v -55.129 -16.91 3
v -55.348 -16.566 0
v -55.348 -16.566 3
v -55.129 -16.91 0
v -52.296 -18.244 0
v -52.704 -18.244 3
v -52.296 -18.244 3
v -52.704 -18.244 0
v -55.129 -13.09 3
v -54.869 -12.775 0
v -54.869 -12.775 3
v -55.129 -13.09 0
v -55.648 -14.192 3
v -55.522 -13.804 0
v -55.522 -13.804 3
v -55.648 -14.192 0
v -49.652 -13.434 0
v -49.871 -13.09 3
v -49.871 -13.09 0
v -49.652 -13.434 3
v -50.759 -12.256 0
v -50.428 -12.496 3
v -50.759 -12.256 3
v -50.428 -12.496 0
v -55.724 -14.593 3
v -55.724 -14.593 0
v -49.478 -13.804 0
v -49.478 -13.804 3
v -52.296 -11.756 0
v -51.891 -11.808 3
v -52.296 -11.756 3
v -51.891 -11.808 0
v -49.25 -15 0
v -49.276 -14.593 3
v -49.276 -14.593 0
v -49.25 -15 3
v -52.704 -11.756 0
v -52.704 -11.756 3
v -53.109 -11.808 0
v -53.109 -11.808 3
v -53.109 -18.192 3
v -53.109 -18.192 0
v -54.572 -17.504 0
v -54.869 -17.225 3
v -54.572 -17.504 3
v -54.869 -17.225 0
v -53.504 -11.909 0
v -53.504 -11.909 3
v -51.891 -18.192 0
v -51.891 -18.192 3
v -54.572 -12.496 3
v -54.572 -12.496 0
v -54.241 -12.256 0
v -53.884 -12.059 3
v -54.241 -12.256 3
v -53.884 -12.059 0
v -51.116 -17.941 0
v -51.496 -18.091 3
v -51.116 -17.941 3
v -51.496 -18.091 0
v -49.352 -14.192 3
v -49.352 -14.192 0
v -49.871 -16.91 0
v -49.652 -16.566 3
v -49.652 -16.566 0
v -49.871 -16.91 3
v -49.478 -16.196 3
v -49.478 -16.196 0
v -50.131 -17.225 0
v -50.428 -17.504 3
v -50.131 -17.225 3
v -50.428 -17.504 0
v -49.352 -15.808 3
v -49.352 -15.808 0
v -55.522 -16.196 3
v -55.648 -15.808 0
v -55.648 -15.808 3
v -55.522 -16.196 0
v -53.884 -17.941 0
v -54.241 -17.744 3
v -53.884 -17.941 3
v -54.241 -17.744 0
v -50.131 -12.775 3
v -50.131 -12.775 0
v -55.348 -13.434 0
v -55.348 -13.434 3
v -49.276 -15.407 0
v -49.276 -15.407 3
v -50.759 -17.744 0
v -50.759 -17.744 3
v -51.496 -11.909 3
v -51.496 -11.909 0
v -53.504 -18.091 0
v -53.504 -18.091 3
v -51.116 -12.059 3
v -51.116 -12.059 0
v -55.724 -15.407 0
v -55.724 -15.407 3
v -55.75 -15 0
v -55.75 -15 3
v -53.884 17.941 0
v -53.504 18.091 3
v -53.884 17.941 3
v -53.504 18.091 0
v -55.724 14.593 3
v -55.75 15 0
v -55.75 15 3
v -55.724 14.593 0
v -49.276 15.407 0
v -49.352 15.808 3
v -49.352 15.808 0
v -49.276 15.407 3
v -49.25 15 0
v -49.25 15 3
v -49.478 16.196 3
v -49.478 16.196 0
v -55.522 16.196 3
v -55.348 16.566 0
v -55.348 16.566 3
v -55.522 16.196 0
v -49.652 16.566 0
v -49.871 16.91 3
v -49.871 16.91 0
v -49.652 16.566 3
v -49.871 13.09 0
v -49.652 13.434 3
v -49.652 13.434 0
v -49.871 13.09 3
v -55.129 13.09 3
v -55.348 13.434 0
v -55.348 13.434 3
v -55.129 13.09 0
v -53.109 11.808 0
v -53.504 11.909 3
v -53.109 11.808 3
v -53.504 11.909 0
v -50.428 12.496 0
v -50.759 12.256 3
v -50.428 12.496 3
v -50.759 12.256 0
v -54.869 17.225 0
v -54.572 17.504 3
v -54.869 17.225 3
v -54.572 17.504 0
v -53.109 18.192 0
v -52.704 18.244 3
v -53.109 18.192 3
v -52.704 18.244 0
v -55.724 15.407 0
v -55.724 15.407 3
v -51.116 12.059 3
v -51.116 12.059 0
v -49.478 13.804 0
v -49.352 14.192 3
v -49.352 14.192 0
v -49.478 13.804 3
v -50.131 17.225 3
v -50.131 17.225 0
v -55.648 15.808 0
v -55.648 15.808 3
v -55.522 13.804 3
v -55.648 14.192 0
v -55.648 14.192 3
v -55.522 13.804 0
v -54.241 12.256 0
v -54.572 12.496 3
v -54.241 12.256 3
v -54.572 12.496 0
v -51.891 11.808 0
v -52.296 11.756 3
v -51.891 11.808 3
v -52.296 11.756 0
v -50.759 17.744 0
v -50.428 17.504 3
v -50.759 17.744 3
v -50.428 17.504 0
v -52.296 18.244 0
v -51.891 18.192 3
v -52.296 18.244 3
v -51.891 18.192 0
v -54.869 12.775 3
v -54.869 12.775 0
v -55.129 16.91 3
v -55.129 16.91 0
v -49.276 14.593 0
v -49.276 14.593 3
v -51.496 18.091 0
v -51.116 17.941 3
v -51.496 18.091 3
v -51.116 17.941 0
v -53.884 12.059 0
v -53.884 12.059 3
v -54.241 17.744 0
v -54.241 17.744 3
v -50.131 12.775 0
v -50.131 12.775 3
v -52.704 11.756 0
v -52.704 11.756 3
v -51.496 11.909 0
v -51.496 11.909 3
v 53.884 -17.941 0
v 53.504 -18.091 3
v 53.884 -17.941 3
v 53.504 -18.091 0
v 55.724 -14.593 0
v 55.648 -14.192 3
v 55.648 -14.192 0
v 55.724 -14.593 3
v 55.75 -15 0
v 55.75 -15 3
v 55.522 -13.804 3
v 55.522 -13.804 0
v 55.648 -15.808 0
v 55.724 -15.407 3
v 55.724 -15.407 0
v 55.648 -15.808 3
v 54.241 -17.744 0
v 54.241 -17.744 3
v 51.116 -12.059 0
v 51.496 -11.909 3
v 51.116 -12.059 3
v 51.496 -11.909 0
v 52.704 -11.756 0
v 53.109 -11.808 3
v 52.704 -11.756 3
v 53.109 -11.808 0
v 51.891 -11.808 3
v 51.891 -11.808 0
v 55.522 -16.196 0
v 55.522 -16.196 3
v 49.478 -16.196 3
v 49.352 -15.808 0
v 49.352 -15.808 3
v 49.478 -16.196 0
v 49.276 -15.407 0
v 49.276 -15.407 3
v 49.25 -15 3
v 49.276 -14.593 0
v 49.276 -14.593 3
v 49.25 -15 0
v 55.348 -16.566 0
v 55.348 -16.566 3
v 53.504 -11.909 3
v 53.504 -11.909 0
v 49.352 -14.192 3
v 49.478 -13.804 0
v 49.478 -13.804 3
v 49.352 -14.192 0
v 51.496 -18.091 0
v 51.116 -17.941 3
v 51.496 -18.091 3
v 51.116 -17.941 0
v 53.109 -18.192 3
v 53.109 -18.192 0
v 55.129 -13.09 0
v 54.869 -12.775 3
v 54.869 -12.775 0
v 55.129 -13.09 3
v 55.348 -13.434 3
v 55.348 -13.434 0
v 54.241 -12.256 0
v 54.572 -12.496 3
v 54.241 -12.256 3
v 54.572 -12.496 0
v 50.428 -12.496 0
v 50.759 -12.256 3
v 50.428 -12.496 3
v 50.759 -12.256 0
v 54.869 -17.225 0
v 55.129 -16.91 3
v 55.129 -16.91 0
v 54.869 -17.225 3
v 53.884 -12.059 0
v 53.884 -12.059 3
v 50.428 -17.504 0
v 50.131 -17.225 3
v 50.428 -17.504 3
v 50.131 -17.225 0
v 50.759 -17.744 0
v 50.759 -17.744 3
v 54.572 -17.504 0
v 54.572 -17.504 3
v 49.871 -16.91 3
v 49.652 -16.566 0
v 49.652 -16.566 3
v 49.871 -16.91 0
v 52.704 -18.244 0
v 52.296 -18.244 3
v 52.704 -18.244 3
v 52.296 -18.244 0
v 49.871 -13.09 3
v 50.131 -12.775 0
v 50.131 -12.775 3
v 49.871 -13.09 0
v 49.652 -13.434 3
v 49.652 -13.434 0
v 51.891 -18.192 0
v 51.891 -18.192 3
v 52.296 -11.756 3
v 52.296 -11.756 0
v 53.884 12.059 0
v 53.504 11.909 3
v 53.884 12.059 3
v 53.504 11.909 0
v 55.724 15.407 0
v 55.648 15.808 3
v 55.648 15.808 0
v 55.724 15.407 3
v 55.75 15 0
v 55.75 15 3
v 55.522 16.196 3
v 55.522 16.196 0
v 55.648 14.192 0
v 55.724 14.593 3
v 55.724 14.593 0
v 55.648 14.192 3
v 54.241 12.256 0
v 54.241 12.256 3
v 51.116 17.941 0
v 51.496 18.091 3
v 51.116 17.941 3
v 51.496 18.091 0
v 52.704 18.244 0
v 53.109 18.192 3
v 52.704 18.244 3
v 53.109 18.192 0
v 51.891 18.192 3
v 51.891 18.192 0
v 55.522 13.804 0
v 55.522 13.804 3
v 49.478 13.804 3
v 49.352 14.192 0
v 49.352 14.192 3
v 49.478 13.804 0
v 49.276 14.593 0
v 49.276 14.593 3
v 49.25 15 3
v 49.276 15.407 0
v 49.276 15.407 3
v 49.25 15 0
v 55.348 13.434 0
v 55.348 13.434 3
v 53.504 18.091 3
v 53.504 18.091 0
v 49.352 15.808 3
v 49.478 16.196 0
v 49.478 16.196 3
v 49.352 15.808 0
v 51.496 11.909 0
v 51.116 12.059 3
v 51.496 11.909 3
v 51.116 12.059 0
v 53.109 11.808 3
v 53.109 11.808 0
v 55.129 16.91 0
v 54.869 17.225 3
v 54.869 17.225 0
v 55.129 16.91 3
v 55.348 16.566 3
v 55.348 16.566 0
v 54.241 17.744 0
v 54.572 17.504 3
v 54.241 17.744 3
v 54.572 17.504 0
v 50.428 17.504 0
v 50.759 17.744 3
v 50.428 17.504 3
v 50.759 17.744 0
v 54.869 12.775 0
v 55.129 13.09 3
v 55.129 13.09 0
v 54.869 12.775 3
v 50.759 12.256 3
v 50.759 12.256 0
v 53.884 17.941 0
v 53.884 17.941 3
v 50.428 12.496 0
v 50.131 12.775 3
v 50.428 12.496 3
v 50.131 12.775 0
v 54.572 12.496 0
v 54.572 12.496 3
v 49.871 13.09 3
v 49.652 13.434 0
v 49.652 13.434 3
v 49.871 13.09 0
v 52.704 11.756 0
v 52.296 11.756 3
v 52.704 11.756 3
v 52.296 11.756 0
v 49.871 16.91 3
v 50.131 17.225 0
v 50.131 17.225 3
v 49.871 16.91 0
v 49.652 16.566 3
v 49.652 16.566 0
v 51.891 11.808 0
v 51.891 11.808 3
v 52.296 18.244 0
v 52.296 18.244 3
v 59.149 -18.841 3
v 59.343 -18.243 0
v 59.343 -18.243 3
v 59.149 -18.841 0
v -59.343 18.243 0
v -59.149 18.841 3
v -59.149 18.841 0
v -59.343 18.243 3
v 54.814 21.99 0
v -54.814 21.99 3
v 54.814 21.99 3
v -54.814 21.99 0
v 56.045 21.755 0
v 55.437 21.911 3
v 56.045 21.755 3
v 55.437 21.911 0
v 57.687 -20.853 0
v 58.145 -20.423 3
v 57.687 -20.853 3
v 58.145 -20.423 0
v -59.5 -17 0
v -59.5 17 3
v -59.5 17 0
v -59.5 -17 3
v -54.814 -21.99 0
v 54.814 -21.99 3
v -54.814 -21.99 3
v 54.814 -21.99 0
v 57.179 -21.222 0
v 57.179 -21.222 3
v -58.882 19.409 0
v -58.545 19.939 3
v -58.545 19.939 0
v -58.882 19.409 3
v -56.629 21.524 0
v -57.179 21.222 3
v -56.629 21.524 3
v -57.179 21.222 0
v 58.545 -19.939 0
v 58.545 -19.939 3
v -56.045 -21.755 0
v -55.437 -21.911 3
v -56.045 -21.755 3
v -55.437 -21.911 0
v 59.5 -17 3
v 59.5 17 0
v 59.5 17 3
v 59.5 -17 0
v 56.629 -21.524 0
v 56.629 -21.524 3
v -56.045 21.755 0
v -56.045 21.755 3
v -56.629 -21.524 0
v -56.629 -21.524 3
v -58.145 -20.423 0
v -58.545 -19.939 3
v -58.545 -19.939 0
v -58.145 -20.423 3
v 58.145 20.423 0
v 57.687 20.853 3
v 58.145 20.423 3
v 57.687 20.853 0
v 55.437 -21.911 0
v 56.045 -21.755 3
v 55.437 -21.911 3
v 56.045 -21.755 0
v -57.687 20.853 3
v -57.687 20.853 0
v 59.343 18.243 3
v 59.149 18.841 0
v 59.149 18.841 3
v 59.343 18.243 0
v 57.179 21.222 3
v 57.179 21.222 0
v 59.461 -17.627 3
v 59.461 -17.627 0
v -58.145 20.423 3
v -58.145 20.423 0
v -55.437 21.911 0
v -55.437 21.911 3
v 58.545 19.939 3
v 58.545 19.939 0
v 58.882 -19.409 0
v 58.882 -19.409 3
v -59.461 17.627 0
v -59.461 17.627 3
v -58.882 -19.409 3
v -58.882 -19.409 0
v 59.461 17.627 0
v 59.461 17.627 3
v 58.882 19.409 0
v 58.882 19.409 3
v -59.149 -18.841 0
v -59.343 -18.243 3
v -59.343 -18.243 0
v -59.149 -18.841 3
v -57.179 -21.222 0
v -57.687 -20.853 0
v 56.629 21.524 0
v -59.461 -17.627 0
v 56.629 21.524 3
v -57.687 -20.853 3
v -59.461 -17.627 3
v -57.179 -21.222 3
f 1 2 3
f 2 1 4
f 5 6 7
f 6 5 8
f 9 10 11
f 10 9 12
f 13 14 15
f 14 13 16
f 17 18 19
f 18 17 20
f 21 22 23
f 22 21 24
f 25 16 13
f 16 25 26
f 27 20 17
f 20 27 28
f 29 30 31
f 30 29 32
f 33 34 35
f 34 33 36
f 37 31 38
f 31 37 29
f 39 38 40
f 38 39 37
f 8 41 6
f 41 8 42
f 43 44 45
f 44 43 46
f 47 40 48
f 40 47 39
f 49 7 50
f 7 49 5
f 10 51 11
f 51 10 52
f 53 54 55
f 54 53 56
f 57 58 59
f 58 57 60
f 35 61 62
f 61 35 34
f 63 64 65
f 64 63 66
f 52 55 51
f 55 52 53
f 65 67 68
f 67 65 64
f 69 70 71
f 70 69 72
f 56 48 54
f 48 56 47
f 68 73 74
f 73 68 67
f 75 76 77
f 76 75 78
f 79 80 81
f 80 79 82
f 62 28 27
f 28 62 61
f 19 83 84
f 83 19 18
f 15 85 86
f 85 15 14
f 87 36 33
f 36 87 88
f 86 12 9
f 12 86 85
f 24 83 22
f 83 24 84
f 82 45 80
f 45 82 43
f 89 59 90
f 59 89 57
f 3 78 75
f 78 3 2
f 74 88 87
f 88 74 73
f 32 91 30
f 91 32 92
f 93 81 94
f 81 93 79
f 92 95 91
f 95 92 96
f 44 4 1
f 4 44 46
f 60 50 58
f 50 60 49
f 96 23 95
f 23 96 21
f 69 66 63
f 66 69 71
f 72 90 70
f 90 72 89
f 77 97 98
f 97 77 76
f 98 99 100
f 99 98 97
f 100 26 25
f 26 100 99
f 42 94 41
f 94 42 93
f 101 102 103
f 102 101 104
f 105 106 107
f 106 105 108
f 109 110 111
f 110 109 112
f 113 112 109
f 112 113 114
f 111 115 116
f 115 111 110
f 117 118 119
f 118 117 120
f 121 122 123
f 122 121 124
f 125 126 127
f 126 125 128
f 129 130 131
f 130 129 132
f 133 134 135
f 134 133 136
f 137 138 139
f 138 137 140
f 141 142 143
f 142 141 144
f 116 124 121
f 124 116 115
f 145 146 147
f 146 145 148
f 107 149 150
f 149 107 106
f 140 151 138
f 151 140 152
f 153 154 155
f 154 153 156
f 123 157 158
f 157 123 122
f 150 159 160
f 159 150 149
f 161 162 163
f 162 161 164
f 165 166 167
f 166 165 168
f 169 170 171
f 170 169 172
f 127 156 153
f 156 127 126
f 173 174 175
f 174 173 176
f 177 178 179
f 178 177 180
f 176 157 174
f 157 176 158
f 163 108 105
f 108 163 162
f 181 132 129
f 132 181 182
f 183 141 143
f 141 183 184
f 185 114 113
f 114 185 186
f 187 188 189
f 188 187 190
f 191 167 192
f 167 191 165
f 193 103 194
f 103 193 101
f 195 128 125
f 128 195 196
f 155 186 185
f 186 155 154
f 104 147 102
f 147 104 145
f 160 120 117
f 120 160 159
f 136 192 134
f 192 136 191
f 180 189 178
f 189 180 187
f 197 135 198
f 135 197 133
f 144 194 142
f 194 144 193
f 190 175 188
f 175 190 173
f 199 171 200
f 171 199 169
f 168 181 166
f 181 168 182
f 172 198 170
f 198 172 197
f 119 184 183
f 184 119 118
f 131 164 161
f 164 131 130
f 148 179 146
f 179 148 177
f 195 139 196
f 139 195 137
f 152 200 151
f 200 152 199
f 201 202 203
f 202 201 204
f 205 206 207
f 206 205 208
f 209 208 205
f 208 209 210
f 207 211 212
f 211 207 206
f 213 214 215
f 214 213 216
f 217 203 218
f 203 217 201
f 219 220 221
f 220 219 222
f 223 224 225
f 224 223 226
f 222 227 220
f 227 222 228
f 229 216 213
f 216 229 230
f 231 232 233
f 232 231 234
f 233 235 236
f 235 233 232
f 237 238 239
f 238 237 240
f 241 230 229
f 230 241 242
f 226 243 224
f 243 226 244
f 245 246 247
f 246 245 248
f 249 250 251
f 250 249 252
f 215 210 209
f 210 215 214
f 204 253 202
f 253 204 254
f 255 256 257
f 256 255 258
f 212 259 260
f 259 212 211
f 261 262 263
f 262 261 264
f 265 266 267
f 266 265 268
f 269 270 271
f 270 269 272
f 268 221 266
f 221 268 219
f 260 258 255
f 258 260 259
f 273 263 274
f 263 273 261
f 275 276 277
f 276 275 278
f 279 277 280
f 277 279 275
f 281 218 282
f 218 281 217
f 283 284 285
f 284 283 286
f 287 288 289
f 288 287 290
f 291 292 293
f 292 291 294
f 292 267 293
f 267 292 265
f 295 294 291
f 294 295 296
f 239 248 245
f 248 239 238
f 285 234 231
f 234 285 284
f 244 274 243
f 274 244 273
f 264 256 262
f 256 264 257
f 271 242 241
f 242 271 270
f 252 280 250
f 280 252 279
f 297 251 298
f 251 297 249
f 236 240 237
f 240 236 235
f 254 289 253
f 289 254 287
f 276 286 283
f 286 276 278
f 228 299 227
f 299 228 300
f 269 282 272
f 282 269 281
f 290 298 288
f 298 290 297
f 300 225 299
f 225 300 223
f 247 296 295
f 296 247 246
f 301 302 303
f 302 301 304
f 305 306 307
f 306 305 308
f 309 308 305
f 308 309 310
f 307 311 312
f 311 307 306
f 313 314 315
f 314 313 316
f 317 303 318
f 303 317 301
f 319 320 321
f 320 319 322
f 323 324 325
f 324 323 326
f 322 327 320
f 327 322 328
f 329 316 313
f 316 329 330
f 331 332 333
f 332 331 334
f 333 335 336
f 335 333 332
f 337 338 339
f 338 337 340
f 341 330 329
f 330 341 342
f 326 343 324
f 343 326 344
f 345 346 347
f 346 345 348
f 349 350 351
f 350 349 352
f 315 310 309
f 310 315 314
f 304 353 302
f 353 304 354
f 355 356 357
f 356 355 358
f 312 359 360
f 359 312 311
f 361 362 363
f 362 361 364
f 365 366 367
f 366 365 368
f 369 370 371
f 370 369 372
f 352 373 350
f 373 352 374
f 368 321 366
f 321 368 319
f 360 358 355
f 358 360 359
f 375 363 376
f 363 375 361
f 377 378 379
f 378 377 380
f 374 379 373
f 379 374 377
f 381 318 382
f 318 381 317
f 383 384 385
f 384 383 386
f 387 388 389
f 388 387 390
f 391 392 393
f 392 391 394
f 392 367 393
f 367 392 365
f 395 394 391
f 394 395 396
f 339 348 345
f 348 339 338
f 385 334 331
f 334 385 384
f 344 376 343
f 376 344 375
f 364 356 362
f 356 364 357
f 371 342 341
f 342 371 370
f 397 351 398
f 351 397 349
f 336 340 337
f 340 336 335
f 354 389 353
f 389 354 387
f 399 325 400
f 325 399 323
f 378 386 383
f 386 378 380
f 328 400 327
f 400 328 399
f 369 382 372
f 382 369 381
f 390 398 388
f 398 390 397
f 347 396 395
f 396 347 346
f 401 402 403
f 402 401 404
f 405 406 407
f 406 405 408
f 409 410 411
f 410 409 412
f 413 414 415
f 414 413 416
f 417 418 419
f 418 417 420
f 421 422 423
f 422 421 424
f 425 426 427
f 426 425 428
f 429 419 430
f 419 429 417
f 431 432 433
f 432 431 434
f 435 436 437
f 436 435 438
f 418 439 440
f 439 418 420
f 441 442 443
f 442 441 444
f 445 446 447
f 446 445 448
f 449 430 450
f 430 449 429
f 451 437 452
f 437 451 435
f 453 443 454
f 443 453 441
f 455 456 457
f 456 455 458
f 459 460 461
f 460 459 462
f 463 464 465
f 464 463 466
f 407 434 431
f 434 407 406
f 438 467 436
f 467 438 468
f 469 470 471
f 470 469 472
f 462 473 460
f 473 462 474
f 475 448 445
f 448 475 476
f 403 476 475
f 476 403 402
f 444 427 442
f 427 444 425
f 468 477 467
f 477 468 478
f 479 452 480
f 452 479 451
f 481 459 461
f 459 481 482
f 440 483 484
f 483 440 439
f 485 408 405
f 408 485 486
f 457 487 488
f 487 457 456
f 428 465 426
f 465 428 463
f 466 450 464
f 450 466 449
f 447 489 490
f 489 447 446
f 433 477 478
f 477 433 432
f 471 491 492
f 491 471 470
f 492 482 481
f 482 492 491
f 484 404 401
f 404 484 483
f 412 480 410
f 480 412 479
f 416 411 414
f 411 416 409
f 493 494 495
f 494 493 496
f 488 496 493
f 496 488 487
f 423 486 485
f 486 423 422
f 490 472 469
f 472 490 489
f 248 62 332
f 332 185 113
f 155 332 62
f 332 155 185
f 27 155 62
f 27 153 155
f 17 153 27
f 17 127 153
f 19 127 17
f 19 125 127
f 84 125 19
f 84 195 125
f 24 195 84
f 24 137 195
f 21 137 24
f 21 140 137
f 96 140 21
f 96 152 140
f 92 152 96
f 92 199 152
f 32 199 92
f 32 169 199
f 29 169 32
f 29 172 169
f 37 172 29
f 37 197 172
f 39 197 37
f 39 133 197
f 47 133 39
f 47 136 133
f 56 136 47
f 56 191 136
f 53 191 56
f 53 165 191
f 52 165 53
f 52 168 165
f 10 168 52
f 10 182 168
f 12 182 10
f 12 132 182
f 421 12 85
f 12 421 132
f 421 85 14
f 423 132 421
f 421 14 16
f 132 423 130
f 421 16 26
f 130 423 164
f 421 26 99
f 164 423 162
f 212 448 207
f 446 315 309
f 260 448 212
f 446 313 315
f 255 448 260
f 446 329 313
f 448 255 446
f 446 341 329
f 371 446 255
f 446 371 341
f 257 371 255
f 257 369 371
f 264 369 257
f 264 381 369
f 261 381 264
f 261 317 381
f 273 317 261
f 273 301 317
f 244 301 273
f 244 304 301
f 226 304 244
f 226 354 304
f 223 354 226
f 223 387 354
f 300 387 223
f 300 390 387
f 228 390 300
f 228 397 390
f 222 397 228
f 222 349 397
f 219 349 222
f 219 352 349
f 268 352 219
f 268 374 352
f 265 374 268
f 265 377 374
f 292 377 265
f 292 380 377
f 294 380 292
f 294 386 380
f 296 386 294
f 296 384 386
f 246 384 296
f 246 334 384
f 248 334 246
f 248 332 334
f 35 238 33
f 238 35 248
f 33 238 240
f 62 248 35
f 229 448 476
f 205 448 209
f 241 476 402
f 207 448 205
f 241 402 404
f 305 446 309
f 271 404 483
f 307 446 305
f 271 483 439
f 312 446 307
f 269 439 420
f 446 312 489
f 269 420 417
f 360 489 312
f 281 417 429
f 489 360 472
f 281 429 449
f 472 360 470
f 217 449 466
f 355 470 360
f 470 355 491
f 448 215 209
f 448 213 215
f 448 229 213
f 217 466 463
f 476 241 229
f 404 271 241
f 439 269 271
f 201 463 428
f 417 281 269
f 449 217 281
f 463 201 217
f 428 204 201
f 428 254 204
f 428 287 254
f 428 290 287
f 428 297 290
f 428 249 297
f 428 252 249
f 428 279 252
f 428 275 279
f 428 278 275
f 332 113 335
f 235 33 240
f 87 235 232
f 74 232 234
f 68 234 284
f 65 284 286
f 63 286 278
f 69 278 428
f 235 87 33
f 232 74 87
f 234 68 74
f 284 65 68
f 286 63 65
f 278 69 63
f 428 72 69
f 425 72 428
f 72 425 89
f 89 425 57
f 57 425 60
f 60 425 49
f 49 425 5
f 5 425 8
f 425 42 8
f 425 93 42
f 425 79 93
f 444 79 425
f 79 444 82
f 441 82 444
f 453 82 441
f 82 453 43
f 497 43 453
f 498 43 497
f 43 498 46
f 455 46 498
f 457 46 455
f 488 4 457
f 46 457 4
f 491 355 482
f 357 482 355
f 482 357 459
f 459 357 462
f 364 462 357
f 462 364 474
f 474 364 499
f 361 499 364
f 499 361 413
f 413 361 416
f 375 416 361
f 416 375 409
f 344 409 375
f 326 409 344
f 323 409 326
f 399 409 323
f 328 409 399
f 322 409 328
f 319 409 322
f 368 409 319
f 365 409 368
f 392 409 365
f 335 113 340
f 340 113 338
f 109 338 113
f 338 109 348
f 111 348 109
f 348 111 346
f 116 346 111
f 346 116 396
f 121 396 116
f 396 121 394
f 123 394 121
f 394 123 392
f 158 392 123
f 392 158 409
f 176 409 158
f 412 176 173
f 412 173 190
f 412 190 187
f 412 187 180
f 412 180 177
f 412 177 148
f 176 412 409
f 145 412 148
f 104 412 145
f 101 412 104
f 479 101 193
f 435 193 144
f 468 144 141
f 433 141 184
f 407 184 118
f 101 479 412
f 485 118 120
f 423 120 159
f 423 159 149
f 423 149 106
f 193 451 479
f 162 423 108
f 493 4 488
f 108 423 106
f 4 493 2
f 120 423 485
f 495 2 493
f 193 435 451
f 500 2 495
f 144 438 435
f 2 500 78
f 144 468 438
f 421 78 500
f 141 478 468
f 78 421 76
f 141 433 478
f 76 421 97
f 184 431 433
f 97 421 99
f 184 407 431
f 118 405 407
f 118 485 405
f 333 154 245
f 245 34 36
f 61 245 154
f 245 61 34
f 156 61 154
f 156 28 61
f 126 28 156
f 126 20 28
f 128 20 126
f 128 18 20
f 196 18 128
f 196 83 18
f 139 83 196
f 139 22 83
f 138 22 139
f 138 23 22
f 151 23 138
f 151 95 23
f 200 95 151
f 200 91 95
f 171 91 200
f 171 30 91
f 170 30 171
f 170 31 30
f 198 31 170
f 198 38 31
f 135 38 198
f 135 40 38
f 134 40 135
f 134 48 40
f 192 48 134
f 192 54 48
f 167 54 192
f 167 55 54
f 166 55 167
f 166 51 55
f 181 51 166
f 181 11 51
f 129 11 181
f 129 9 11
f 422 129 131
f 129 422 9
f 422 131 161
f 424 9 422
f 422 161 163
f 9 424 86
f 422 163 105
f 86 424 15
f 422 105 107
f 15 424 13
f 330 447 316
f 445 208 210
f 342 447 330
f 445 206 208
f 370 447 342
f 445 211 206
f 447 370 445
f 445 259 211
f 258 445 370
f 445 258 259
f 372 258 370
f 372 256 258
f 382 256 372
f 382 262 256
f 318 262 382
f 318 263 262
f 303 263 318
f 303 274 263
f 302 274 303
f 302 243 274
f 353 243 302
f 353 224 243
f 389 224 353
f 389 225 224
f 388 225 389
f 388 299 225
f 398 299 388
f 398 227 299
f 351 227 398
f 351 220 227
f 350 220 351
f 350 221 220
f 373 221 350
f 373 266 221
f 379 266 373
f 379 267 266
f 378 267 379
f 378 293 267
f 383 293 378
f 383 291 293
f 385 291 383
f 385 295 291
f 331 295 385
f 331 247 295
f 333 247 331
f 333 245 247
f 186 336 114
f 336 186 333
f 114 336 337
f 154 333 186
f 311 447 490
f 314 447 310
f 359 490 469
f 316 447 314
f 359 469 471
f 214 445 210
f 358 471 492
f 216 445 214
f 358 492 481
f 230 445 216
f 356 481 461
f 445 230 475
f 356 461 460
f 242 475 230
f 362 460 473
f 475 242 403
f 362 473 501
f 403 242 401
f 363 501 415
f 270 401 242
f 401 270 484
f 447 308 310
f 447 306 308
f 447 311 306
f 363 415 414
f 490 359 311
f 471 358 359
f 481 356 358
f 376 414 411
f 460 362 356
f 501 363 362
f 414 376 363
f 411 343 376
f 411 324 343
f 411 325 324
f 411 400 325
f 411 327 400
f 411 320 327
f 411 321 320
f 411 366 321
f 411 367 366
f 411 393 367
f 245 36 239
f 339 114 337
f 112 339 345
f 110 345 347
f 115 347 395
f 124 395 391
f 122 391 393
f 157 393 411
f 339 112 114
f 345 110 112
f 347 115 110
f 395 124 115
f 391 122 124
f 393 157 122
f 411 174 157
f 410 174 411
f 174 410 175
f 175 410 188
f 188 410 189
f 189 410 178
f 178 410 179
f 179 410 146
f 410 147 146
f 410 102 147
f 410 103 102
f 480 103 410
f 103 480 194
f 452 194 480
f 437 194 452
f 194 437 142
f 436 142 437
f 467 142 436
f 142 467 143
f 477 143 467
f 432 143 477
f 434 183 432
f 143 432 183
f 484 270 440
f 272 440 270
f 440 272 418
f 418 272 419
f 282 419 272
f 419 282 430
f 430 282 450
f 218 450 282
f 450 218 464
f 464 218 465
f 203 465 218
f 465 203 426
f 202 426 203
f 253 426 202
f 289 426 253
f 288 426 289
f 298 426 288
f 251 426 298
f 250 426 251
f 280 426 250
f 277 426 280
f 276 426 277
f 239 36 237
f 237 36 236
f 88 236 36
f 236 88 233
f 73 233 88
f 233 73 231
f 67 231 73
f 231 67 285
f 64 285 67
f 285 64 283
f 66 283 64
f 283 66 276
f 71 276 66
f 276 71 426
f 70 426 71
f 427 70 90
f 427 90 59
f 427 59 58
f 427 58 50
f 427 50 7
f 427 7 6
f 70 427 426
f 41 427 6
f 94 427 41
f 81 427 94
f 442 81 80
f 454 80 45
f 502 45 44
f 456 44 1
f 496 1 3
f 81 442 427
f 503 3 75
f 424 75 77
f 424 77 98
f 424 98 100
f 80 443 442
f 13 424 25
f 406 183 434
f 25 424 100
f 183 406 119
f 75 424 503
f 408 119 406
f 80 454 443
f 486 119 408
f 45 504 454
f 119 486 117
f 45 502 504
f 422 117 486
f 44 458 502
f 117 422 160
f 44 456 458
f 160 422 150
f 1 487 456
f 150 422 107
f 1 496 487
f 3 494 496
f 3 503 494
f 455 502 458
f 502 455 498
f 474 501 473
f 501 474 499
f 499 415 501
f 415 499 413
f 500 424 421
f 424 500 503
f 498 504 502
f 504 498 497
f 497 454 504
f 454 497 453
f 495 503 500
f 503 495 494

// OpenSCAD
$fn = 50;


difference() {
	union() {
		hull() {
			translate(v = [-54.5000000000, 17.0000000000, 0]) {
				cylinder(h = 3, r = 5);
			}
			translate(v = [54.5000000000, 17.0000000000, 0]) {
				cylinder(h = 3, r = 5);
			}
			translate(v = [-54.5000000000, -17.0000000000, 0]) {
				cylinder(h = 3, r = 5);
			}
			translate(v = [54.5000000000, -17.0000000000, 0]) {
				cylinder(h = 3, r = 5);
			}
		}
	}
	union() {
		translate(v = [-52.5000000000, -15.0000000000, -100.0000000000]) {
			cylinder(h = 200, r = 3.2500000000);
		}
		translate(v = [-52.5000000000, 15.0000000000, -100.0000000000]) {
			cylinder(h = 200, r = 3.2500000000);
		}
		translate(v = [52.5000000000, -15.0000000000, -100.0000000000]) {
			cylinder(h = 200, r = 3.2500000000);
		}
		translate(v = [52.5000000000, 15.0000000000, -100.0000000000]) {
			cylinder(h = 200, r = 3.2500000000);
		}
	}
}
